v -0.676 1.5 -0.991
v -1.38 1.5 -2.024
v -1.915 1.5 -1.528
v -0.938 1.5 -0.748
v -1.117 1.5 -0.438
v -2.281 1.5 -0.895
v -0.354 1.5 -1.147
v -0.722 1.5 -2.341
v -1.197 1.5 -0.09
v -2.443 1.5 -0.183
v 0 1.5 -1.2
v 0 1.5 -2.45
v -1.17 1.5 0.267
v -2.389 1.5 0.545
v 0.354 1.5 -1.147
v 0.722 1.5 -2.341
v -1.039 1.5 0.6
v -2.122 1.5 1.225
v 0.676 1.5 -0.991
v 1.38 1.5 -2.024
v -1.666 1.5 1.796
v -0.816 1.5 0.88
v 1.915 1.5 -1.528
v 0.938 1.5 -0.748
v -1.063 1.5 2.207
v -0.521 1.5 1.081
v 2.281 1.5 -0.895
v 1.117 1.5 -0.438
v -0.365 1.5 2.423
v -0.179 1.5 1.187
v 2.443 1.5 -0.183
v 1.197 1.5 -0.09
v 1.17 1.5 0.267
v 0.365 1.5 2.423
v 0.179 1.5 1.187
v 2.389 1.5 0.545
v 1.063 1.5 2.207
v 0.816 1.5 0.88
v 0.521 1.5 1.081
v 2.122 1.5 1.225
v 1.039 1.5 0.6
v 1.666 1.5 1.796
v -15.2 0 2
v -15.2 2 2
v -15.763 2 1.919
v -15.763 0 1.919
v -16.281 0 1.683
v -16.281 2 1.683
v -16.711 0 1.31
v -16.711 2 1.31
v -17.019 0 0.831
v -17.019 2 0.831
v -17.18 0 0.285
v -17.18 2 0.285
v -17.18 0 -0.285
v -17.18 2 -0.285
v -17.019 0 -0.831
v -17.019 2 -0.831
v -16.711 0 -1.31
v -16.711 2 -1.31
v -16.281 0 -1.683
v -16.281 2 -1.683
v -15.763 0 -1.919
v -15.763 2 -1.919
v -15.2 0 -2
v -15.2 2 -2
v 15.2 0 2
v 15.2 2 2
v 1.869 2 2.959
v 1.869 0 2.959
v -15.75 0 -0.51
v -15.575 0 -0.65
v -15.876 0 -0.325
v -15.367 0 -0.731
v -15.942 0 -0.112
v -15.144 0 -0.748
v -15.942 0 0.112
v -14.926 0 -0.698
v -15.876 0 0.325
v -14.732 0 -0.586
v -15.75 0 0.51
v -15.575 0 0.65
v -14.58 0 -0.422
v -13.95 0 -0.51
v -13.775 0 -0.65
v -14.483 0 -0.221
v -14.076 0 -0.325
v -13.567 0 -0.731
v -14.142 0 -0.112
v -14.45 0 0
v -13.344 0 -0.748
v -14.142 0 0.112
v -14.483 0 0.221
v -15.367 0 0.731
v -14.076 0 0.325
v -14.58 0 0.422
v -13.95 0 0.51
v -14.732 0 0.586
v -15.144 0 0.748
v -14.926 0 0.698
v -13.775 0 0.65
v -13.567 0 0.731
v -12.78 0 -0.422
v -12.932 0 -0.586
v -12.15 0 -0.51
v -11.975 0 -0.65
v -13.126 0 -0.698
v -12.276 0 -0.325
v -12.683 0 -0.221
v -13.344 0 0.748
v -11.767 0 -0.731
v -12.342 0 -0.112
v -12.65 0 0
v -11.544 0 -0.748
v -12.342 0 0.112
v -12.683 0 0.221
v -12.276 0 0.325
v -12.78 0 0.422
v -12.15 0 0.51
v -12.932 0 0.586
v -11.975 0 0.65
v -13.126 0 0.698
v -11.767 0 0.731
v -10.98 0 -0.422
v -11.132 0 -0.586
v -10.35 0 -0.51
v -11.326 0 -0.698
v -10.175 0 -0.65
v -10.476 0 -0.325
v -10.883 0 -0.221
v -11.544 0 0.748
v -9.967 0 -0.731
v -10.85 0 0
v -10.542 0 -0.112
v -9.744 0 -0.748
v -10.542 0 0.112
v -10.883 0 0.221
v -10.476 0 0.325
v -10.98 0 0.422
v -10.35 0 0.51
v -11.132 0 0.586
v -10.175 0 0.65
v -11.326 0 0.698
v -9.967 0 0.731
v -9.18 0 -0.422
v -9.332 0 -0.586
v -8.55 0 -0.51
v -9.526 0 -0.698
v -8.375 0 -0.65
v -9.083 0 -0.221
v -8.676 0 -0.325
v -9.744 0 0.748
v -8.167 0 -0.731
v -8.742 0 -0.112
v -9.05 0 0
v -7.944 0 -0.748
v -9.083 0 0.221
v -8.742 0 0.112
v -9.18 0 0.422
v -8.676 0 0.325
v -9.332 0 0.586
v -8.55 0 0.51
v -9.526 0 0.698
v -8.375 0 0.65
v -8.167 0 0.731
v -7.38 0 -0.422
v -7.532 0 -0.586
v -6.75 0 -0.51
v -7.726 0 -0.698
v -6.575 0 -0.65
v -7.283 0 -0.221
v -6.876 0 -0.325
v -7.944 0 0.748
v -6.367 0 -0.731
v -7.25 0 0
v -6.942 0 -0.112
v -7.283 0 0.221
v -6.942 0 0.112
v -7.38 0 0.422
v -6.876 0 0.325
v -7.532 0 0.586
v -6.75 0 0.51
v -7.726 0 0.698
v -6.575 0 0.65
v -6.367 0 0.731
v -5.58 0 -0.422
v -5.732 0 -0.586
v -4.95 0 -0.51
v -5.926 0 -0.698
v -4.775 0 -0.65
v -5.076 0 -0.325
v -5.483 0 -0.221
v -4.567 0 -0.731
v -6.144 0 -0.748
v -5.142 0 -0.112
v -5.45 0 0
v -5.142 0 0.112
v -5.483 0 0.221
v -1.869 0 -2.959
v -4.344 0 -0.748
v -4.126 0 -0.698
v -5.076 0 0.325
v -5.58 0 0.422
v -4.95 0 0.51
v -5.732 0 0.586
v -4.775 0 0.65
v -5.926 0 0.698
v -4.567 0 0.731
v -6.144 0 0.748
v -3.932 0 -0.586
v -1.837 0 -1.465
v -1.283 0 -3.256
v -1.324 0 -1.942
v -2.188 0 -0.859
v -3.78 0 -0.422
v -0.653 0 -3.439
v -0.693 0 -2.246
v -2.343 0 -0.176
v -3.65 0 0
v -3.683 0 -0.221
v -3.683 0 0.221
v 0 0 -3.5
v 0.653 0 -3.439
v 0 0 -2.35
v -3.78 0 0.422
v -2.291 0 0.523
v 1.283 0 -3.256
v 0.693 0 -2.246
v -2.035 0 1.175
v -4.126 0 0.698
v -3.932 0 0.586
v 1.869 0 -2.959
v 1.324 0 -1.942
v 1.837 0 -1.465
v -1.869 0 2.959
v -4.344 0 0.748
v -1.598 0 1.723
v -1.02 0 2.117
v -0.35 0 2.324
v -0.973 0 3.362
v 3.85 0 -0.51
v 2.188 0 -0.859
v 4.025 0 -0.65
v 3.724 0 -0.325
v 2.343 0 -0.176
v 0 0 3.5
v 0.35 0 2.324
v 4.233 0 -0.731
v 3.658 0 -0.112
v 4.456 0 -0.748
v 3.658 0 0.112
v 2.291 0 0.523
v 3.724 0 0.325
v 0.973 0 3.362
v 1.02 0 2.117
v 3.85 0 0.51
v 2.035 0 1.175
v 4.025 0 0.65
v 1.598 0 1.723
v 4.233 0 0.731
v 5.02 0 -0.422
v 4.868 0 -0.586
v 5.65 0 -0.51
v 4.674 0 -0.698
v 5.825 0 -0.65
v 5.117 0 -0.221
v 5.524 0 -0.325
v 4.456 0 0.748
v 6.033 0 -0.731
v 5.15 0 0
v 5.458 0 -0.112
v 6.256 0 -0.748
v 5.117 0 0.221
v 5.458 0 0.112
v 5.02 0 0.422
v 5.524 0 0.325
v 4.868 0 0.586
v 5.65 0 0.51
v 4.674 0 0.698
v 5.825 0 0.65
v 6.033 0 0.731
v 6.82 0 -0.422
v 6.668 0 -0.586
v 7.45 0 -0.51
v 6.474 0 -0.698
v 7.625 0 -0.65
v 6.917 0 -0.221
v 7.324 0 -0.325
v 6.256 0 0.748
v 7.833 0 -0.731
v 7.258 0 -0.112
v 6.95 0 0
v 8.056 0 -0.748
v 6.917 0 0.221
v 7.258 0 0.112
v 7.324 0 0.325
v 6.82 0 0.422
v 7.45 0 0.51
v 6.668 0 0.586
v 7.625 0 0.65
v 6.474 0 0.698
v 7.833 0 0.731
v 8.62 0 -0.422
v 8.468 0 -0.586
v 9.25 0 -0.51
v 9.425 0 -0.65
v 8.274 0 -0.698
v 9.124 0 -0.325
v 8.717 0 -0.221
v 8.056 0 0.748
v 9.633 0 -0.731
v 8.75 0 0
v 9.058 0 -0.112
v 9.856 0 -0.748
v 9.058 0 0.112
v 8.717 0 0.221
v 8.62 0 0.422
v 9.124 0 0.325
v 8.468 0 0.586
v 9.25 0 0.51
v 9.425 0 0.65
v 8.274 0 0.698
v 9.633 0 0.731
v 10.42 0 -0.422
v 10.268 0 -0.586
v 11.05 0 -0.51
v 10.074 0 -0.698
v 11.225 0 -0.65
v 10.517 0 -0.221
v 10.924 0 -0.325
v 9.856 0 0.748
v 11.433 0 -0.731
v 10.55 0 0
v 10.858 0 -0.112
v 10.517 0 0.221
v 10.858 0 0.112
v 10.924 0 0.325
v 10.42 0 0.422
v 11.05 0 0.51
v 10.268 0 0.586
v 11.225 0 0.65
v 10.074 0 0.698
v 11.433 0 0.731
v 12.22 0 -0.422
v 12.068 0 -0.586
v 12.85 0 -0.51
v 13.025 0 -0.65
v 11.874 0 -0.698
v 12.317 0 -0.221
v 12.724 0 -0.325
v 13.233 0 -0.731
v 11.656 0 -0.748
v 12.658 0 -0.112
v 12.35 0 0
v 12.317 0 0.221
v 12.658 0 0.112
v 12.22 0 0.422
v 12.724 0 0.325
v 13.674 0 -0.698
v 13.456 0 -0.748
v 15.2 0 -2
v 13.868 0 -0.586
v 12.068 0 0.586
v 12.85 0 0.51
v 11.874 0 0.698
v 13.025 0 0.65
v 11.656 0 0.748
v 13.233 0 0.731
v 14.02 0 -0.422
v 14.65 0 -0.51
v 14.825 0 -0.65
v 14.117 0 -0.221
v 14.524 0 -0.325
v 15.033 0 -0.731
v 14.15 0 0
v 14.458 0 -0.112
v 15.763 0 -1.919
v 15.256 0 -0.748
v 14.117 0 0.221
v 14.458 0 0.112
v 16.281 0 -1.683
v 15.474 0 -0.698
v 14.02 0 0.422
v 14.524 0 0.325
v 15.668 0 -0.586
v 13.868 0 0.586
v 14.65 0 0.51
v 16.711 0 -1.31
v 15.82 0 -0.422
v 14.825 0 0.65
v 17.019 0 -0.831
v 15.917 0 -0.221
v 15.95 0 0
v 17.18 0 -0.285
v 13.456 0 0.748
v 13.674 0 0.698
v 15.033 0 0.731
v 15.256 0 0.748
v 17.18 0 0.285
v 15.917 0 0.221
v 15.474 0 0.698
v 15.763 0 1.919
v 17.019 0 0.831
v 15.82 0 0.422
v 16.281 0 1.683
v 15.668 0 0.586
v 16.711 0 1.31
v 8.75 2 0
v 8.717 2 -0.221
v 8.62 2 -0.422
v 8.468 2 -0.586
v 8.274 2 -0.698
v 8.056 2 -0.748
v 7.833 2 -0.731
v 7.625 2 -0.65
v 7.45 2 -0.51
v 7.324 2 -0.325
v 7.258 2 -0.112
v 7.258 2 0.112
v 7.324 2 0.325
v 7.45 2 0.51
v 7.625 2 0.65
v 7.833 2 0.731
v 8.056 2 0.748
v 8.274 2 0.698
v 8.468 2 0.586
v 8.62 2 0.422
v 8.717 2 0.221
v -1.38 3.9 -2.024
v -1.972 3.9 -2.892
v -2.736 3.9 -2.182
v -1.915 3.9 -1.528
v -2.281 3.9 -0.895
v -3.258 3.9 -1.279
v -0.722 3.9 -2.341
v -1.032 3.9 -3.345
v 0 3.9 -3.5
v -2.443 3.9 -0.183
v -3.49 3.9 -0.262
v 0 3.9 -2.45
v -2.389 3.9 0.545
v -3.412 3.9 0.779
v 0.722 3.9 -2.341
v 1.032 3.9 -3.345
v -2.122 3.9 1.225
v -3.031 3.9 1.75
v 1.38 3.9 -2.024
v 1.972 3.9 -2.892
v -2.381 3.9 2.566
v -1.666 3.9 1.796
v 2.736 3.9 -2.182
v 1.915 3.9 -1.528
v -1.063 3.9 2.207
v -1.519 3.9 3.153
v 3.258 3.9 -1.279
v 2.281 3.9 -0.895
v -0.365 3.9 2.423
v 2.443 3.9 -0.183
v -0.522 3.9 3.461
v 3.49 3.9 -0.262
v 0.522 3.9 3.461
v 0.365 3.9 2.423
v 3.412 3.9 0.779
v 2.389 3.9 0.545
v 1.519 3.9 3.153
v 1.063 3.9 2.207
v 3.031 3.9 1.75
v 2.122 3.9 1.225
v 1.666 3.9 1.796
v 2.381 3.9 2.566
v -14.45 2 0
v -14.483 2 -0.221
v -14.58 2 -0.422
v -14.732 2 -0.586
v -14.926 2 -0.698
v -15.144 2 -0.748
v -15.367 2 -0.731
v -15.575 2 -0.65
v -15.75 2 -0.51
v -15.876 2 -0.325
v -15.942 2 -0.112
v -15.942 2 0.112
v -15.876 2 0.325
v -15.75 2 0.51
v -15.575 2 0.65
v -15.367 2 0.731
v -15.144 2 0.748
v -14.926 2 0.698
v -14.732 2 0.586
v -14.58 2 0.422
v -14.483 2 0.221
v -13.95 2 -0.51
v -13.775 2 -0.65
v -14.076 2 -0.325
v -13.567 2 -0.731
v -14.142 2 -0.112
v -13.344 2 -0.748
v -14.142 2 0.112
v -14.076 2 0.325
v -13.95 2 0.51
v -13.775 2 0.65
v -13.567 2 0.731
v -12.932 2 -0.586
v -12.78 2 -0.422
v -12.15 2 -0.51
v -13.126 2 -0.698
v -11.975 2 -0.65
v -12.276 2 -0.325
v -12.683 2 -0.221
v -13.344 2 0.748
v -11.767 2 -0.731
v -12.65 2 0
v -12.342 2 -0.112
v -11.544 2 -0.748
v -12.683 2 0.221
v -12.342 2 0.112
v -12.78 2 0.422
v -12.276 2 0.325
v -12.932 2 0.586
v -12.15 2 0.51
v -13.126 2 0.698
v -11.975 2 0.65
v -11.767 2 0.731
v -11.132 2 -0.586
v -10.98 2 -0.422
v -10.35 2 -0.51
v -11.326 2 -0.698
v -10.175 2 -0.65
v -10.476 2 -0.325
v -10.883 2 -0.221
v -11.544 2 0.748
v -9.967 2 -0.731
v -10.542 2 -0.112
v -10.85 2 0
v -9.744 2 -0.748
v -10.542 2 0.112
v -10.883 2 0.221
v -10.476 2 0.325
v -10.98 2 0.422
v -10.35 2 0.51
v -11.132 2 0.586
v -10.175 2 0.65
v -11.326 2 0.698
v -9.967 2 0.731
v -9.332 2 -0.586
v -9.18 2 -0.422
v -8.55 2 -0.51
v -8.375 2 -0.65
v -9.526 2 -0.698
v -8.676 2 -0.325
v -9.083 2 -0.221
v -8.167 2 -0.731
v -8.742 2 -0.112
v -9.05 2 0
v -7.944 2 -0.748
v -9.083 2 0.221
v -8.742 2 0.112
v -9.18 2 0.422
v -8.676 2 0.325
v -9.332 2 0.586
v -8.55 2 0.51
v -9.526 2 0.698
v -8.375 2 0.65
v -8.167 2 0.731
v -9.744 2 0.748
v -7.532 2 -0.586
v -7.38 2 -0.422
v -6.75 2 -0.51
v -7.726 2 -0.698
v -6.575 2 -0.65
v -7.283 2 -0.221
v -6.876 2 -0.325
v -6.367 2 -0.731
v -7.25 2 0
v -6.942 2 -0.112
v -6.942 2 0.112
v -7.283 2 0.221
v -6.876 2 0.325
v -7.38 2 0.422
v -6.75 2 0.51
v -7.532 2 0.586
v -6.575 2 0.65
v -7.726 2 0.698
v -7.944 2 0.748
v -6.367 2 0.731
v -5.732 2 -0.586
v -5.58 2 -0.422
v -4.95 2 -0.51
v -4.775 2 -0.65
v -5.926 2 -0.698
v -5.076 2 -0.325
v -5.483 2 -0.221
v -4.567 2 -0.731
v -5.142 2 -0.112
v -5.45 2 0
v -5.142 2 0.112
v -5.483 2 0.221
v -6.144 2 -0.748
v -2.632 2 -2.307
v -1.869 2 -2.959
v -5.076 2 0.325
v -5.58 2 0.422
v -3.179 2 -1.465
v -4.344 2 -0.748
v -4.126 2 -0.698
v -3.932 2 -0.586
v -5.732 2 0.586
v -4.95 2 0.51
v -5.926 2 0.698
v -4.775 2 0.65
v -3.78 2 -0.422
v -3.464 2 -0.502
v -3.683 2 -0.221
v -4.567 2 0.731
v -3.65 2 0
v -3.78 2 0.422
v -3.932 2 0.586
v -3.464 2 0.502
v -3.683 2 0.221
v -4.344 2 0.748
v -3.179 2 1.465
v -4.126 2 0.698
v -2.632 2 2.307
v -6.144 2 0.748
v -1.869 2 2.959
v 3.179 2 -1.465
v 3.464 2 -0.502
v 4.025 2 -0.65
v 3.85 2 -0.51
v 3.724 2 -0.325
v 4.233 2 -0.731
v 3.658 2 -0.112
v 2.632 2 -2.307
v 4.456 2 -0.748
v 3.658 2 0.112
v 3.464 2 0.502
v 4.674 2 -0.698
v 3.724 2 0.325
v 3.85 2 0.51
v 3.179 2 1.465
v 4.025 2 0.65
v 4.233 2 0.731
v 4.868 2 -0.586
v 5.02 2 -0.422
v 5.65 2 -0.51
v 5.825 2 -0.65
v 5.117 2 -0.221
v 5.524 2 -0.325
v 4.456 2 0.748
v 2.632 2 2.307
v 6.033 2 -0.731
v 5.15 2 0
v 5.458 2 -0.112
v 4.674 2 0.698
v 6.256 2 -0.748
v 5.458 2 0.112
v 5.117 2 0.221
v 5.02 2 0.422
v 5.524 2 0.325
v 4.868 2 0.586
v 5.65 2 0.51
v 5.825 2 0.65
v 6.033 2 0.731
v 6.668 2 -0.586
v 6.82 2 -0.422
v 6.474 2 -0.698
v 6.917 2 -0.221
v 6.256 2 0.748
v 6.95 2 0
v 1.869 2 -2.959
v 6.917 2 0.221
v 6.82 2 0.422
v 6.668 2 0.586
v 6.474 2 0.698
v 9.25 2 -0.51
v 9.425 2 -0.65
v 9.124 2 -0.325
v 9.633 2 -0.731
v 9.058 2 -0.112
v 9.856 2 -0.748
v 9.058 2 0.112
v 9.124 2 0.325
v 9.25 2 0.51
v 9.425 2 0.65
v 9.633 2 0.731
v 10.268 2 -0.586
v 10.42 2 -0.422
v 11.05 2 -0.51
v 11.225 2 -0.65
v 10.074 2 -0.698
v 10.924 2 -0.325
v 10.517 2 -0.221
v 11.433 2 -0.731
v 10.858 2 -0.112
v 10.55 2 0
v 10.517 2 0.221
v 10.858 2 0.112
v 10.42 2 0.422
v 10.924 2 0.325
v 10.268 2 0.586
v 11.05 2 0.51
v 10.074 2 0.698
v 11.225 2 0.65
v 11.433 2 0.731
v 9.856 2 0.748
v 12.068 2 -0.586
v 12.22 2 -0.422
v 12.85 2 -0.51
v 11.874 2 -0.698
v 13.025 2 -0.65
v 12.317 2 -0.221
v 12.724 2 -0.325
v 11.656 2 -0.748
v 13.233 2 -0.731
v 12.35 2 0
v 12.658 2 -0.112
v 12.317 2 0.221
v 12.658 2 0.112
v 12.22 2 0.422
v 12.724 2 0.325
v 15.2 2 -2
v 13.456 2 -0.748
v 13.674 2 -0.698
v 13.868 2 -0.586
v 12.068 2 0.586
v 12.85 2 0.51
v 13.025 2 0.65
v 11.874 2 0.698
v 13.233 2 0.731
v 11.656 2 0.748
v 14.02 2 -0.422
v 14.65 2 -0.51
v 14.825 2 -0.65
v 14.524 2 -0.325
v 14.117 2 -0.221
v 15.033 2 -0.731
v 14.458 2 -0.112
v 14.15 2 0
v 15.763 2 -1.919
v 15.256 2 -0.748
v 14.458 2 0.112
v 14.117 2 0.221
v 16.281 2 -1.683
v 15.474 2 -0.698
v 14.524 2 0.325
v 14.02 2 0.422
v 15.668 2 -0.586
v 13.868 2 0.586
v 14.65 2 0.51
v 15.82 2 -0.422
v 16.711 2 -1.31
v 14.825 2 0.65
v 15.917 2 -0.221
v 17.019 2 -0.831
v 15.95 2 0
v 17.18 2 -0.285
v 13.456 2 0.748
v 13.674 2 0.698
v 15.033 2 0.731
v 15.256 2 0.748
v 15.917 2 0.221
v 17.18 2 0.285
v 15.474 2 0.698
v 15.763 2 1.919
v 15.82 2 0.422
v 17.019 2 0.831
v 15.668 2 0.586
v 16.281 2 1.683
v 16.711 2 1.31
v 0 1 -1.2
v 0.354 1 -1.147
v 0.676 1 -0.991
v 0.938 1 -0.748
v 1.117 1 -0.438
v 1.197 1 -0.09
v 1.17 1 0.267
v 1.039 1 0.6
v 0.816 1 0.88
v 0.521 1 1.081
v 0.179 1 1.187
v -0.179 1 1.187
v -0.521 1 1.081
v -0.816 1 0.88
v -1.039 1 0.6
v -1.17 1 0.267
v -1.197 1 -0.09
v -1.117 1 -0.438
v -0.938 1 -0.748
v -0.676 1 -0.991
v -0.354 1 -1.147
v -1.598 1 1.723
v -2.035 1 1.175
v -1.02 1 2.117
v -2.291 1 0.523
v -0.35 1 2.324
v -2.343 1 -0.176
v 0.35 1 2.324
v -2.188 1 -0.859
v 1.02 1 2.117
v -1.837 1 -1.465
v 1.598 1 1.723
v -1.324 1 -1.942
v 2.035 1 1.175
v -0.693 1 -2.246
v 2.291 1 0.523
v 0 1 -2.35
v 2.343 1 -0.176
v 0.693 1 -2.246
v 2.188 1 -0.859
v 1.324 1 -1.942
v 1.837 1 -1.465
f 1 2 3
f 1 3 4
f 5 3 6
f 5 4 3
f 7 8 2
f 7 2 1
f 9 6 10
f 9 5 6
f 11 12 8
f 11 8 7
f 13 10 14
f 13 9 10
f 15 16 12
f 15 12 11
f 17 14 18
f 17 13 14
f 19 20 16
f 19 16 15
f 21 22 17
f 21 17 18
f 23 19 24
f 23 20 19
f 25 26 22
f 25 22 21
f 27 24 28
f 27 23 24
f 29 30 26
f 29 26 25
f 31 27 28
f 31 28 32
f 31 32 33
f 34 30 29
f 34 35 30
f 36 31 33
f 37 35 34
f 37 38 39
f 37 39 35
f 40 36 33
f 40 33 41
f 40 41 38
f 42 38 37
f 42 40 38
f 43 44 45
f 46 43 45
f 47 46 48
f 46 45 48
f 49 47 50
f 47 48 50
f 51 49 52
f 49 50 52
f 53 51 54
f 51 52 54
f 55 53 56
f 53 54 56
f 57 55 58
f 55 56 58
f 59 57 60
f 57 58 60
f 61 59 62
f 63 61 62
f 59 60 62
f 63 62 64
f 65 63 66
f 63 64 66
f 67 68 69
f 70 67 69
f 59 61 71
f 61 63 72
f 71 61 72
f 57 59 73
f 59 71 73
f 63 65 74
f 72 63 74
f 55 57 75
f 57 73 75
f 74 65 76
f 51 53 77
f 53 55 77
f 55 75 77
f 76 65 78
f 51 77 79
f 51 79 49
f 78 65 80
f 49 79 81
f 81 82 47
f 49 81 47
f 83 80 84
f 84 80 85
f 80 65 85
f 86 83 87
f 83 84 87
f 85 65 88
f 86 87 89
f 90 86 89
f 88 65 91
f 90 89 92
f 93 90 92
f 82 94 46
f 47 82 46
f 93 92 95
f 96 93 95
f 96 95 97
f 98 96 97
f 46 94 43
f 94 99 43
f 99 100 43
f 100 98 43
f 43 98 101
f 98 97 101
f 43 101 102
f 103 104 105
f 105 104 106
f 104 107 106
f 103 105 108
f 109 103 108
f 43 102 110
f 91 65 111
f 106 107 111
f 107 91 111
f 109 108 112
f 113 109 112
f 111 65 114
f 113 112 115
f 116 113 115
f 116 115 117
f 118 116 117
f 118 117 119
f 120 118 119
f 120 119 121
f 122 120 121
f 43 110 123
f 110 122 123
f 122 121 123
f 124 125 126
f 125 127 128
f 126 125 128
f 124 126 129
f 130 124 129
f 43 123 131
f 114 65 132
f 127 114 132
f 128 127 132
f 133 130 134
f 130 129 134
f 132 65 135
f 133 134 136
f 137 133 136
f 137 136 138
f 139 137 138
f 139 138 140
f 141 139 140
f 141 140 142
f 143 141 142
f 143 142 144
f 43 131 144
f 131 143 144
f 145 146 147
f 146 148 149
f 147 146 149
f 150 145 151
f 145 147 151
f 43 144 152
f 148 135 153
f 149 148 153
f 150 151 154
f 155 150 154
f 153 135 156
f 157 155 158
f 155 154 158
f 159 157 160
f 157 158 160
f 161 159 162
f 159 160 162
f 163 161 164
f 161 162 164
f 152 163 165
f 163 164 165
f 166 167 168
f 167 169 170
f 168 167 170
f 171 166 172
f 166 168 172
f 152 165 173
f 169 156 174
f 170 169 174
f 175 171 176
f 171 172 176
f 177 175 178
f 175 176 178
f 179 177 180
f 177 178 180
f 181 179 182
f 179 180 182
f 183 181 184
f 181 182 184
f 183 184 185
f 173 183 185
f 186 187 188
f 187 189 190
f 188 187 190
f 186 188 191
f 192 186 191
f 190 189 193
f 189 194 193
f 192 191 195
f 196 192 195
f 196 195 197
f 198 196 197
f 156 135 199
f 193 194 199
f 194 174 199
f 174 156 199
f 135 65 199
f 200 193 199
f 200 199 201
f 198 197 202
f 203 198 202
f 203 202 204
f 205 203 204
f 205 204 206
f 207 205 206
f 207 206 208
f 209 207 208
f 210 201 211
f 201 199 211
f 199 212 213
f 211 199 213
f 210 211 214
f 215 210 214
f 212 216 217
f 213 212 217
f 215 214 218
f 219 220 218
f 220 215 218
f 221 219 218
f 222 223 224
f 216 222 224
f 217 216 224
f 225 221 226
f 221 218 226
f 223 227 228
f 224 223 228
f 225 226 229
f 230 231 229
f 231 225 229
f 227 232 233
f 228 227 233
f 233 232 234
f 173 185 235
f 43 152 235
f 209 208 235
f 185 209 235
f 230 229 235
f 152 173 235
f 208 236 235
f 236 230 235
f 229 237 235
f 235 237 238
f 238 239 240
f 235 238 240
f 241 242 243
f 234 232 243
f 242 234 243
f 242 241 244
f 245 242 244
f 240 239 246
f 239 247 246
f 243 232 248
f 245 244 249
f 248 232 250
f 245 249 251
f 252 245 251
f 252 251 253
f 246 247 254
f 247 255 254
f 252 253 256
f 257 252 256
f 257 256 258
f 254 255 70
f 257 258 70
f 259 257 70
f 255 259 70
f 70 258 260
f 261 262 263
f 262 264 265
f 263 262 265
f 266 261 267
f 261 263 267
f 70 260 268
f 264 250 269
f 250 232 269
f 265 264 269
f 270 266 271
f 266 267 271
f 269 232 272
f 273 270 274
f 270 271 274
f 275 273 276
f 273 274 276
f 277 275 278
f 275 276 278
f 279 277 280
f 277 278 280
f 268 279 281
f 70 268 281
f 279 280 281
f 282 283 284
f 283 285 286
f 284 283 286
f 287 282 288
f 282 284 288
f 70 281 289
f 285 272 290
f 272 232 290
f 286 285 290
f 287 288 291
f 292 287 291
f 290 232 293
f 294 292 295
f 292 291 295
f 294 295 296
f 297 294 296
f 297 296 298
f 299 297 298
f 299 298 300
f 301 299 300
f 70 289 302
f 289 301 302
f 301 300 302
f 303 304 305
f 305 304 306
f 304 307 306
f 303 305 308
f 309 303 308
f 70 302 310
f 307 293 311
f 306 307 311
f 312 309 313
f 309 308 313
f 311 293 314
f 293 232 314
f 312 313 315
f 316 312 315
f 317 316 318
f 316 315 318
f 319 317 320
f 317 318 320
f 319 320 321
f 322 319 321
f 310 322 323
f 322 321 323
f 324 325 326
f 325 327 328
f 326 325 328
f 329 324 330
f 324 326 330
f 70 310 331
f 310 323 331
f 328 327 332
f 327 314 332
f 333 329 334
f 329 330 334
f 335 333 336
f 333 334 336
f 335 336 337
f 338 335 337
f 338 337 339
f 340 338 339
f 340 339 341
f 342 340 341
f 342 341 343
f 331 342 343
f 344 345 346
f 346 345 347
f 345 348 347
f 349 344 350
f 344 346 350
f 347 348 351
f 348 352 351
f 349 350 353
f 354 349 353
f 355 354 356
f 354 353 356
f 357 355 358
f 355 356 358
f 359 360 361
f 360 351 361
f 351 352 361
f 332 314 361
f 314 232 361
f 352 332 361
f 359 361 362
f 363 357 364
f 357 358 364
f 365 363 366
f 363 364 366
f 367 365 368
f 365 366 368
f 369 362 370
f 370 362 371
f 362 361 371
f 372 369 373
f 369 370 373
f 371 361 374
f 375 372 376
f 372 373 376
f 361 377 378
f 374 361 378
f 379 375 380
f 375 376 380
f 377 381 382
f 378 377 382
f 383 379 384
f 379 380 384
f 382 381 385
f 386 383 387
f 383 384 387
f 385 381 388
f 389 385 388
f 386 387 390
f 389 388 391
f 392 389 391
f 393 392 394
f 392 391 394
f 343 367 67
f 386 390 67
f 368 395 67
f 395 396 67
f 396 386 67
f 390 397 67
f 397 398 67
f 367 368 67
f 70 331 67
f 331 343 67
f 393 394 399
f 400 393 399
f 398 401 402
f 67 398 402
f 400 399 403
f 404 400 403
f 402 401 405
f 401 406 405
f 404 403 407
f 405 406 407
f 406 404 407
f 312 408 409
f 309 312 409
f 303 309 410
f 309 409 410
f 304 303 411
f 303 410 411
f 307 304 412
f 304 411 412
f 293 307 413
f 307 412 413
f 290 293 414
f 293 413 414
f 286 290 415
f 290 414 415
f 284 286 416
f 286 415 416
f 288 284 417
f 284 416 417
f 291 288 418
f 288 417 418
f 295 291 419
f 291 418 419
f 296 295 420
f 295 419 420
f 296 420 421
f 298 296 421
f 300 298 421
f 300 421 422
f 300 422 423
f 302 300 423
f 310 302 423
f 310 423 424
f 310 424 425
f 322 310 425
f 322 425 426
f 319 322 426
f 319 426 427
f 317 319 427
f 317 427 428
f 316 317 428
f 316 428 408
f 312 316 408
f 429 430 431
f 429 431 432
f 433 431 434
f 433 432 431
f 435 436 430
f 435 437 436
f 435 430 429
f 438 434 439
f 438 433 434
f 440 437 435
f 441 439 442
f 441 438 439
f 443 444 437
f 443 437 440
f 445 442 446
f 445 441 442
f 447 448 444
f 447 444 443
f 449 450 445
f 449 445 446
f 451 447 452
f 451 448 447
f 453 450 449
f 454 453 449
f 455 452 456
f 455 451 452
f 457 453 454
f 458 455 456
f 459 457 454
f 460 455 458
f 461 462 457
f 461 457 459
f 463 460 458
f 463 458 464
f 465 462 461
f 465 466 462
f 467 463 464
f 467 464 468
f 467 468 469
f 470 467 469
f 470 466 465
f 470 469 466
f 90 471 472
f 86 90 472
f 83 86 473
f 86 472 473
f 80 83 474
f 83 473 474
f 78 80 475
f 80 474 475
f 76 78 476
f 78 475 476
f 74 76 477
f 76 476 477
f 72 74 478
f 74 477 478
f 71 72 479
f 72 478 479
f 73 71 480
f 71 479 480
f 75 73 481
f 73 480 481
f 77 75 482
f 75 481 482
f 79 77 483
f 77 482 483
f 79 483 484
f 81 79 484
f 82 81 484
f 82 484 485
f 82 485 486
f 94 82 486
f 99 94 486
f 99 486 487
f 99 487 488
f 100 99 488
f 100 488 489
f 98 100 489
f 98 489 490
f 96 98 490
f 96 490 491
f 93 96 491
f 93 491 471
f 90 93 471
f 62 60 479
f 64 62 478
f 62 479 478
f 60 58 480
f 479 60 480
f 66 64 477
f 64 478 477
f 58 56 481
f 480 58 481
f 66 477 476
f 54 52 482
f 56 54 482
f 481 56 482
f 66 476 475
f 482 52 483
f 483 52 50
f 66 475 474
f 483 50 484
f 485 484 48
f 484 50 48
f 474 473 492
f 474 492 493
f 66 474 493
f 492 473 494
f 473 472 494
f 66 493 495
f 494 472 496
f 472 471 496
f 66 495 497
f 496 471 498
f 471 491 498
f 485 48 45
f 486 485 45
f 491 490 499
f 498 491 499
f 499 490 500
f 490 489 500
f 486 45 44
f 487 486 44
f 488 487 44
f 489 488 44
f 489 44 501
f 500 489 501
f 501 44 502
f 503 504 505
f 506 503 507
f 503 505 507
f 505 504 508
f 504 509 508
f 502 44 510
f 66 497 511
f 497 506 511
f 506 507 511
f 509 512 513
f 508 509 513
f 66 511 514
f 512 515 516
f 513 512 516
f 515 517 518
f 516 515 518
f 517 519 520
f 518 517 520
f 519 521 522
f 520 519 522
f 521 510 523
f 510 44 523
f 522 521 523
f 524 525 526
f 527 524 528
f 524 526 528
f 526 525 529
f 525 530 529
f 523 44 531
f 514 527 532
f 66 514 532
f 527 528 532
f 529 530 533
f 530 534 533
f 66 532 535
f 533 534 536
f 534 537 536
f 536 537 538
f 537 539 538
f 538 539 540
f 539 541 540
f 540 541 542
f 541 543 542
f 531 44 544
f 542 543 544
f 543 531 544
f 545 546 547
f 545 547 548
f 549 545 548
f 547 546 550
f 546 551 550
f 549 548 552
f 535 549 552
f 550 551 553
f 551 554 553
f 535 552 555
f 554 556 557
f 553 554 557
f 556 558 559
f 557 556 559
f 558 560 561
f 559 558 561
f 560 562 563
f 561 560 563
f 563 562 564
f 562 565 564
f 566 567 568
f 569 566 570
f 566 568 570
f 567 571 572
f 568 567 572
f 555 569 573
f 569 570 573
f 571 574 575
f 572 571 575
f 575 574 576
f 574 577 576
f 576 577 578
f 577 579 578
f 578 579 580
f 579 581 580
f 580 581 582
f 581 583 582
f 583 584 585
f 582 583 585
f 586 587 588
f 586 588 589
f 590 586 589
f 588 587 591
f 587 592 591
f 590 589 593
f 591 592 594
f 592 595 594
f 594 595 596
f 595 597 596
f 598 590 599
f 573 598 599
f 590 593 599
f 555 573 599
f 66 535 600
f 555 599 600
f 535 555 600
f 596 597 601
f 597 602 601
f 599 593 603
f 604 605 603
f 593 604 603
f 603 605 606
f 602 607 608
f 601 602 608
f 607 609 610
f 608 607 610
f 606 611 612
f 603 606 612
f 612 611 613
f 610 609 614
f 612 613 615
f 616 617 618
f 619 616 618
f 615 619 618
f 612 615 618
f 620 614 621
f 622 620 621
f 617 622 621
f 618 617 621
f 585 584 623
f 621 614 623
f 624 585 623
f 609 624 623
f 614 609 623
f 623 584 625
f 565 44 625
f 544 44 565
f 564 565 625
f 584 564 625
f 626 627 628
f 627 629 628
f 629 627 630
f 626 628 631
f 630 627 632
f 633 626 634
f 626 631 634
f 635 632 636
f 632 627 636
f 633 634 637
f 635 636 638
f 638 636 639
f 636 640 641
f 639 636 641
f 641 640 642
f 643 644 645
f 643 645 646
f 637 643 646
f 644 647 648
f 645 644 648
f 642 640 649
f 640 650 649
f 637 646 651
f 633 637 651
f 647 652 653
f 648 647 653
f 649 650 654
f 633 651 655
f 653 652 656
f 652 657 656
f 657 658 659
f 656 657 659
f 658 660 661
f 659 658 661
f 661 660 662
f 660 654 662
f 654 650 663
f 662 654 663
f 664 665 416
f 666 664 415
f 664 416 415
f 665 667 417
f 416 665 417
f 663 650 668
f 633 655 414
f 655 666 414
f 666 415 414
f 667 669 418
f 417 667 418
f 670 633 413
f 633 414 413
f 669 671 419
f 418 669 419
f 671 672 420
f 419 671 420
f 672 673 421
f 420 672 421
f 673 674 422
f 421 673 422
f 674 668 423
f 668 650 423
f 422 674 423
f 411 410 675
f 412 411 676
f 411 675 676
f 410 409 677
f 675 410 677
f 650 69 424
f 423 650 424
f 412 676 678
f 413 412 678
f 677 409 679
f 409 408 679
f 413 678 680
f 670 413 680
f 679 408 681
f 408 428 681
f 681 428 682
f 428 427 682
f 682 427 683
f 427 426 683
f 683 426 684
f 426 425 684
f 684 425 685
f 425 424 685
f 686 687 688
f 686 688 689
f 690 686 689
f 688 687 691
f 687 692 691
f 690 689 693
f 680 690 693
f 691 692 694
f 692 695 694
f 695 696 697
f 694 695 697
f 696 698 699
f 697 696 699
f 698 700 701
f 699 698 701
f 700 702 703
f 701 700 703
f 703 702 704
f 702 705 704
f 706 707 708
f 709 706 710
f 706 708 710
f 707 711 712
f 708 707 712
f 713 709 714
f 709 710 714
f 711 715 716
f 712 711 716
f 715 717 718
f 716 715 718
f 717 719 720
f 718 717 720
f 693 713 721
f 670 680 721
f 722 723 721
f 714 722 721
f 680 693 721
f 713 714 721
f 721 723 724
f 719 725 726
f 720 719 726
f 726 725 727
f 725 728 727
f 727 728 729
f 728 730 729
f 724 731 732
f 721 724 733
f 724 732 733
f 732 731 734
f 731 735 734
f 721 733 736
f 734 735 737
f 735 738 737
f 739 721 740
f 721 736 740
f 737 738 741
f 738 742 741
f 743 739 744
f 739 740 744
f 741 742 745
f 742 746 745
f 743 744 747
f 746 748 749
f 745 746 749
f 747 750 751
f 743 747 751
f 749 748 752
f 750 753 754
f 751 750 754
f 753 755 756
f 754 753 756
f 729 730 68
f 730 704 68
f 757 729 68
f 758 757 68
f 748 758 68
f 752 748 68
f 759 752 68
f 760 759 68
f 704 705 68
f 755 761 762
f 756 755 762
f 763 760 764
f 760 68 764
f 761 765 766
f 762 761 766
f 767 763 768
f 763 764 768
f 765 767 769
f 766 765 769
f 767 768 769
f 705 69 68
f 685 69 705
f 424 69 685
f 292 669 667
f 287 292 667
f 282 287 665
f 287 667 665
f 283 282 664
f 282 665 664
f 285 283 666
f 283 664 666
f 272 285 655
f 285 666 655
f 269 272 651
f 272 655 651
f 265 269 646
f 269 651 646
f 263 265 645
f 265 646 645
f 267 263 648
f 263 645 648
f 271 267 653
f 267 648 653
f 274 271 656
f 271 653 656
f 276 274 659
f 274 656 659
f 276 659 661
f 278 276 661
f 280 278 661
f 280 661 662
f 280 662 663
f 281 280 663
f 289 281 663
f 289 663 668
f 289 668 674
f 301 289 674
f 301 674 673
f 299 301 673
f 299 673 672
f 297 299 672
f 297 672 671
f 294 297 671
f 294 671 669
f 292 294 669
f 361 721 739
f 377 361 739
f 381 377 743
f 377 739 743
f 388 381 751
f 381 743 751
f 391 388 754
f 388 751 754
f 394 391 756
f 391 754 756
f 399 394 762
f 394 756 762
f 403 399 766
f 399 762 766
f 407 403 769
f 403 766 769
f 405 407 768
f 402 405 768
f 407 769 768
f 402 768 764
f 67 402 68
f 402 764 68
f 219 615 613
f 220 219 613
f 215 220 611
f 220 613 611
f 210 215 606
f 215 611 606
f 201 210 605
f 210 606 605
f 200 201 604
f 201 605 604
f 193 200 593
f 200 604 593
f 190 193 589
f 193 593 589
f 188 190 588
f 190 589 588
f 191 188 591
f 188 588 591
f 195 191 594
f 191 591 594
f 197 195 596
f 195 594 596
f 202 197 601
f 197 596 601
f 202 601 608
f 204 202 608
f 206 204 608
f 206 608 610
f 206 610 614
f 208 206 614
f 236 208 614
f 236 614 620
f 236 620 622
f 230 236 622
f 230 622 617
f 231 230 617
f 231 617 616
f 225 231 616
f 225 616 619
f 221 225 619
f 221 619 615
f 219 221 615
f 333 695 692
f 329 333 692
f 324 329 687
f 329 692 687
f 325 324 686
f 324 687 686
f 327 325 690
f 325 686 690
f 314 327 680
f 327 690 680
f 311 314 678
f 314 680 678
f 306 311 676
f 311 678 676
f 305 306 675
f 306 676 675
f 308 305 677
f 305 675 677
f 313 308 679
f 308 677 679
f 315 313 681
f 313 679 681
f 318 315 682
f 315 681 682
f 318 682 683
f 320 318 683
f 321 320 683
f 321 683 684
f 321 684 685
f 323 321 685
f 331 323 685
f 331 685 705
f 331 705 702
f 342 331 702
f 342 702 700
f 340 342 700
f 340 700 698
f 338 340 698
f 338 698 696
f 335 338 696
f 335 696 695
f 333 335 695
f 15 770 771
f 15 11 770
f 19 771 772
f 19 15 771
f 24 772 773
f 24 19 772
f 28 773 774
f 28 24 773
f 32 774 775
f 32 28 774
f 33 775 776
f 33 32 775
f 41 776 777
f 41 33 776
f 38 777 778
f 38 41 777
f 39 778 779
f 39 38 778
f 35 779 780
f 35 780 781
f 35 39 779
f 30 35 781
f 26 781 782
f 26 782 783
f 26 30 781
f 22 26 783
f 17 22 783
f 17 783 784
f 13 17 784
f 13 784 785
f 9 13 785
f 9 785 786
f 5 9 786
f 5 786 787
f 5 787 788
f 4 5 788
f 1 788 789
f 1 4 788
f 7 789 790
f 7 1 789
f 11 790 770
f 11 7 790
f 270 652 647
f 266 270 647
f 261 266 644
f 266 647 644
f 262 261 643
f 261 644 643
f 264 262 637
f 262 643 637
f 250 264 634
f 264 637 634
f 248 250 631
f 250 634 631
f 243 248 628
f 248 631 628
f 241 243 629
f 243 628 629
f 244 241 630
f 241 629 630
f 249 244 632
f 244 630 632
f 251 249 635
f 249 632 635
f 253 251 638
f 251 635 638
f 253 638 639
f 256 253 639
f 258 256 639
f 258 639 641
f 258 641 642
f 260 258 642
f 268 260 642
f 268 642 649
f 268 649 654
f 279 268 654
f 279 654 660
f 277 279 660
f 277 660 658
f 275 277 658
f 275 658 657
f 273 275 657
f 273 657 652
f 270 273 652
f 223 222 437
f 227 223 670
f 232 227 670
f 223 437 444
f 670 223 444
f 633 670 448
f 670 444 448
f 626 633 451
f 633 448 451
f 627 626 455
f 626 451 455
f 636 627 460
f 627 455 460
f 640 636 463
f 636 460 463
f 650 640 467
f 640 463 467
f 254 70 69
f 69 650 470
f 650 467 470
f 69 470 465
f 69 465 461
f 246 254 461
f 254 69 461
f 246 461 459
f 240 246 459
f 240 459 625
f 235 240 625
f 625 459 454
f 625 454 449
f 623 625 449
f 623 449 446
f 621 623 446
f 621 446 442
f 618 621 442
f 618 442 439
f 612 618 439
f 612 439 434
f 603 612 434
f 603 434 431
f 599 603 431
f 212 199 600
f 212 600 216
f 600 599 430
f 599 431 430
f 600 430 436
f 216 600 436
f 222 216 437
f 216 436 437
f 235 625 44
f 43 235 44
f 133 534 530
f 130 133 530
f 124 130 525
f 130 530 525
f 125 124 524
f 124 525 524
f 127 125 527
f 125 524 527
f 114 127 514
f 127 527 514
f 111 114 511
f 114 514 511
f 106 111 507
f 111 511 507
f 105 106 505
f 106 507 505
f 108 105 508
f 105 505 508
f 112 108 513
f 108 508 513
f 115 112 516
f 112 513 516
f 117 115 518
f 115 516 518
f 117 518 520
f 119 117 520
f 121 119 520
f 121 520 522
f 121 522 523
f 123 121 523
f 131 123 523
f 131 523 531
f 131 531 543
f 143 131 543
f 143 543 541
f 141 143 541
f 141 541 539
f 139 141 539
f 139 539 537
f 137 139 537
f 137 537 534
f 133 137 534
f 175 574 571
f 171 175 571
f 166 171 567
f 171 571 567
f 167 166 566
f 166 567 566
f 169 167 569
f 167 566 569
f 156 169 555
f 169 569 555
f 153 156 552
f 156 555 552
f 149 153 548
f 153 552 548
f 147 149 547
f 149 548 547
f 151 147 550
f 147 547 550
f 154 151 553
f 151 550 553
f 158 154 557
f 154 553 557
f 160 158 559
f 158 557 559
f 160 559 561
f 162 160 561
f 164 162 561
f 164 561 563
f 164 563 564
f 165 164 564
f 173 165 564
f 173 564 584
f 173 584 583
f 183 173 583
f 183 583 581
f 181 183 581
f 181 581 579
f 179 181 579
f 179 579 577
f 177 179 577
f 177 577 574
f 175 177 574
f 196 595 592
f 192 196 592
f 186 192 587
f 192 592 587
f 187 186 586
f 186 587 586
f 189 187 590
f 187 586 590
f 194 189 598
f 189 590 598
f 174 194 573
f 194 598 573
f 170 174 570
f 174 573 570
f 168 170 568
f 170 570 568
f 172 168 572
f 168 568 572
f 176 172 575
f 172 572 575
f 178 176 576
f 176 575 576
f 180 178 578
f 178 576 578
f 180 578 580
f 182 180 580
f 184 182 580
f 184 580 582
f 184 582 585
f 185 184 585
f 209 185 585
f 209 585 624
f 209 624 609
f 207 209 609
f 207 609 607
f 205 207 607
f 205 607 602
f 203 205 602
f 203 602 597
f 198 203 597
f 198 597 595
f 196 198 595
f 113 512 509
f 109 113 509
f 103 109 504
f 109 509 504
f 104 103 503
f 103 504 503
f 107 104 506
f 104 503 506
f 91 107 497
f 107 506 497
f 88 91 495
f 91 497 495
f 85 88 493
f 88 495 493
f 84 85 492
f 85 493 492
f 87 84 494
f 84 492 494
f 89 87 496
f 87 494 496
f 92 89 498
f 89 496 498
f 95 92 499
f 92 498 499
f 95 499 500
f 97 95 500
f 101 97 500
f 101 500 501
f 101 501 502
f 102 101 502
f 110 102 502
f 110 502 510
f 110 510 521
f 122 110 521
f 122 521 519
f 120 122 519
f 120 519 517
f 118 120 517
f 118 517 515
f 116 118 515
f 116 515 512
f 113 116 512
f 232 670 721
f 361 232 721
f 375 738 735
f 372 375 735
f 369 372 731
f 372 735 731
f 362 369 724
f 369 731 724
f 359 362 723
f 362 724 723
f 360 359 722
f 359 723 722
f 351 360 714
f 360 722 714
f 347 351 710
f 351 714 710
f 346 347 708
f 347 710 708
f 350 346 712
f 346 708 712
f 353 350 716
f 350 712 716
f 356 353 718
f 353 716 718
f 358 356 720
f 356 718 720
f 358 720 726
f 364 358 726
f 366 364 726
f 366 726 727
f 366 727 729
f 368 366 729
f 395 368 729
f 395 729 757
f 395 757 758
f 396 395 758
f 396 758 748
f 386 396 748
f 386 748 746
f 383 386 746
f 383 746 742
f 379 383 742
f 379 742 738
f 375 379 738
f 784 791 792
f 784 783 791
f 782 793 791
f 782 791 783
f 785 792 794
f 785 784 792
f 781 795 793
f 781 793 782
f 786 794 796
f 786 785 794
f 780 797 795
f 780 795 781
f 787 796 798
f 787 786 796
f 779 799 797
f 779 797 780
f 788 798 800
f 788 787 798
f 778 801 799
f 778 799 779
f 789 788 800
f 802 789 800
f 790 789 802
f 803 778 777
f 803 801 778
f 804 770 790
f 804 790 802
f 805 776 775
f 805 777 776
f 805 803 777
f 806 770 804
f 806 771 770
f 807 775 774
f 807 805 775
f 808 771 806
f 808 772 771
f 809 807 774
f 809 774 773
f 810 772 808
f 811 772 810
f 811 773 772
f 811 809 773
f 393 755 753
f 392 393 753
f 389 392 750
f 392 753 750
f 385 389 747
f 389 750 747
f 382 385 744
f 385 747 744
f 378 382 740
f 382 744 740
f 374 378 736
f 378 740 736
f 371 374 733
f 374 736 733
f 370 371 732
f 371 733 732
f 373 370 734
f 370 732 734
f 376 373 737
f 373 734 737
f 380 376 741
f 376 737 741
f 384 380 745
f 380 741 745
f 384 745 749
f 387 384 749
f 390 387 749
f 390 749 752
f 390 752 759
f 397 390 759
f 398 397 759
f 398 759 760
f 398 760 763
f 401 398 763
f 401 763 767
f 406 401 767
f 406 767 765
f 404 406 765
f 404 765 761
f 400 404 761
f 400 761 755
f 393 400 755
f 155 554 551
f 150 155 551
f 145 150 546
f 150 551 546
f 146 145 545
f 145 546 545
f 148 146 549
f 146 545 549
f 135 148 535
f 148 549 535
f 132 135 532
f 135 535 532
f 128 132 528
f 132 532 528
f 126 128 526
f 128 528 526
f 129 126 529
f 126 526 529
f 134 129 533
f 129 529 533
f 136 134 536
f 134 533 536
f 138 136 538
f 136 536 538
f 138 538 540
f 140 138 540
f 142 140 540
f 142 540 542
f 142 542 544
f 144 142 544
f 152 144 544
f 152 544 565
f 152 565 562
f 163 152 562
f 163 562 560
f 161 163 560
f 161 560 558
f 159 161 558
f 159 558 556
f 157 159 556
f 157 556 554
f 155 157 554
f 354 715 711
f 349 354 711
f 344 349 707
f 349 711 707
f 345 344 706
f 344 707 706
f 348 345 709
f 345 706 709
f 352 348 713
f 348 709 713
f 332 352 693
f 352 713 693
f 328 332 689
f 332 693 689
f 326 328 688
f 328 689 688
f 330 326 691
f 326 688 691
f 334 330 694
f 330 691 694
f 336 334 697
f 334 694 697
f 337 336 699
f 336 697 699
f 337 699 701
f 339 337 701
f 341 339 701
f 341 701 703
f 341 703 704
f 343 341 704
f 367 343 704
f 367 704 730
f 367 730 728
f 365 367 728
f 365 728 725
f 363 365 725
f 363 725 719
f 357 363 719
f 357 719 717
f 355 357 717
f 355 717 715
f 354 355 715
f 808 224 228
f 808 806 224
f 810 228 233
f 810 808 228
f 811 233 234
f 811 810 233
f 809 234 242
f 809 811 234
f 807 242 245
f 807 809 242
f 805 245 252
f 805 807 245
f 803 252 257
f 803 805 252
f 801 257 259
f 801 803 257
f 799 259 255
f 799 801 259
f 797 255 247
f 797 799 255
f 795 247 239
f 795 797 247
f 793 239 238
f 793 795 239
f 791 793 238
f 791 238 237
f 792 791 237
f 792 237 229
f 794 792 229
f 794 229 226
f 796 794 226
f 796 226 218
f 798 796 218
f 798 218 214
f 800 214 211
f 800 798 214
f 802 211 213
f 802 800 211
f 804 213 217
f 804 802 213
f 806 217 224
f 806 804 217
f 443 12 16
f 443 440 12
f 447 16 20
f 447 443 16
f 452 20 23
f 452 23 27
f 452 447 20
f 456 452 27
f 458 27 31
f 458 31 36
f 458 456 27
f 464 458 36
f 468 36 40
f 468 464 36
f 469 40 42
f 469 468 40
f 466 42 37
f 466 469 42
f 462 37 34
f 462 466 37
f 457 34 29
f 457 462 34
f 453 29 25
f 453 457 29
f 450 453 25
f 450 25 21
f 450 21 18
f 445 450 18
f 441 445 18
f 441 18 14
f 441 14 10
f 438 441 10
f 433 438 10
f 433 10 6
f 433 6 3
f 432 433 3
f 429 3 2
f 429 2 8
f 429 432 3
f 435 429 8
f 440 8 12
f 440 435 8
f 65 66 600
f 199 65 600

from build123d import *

# Parameters (mm, degrees)
SKETCH1_W             = 3.5
SKETCH1_H             = 3.9
BOSS_EXTRUDE1_START   = -2
BOSS_EXTRUDE1_DEPTH   = 2
BOSS_EXTRUDE2_START   = -2
BOSS_EXTRUDE2_DEPTH   = 2
F_1_5MM_DOWEL_HOLE1_D = 1.5


with BuildPart() as part:
    # Sketch1 → Revolve1 (revolve)
    with BuildSketch(Plane.XY, mode=Mode.PRIVATE) as revolve1_sk:
        with Locations((1.75, 1.95)):
            Rectangle(SKETCH1_W, SKETCH1_H)
    revolve(revolve1_sk.sketch.rotate(Axis((0, 3.9, 0), (0, -1, 0)), 270), axis=Axis((0, 3.9, 0), (0, -1, 0)))

    # Sketch2 → Boss-Extrude1 (add)
    with BuildSketch(Plane.XZ.offset(BOSS_EXTRUDE1_START)):
        with BuildLine():
            Line((-1.868584713, 2.959457918), (-15.2, 2))
            ThreePointArc((-15.2, 2), (-17.2, 0), (-15.2, -2))
            Line((-15.2, -2), (-1.868584713, -2.959457918))
            ThreePointArc((-1.868584713, -2.959457918), (-3.5, 0), (-1.868584713, 2.959457918))
        make_face()
    extrude(amount=BOSS_EXTRUDE1_DEPTH)

    # Sketch3 → Boss-Extrude2 (add)
    with BuildSketch(Plane.XZ.offset(BOSS_EXTRUDE2_START)):
        with BuildLine():
            Line((1.868584713, -2.959457918), (15.2, -2))
            ThreePointArc((15.2, -2), (17.2, 0), (15.2, 2))
            Line((15.2, 2), (1.868584713, 2.959457918))
            ThreePointArc((1.868584713, 2.959457918), (3.5, 0), (1.868584713, -2.959457918))
        make_face()
    extrude(amount=BOSS_EXTRUDE2_DEPTH)

    # Sketch4 → Cut-Revolve1 (revolve, cut)
    with BuildSketch(Plane.XY, mode=Mode.PRIVATE) as cut_revolve1_sk:
        Polygon((2.45, 3.9), (0, 3.9), (0, 0), (2.35, 0), (2.35, 1), (1.2, 1), (1.2, 1.5), (2.45, 1.5), align=None)
    revolve(cut_revolve1_sk.sketch.rotate(Axis((0, 3.9, 0), (0, -1, 0)), 270), axis=Axis((0, 3.9, 0), (0, -1, 0)), mode=Mode.SUBTRACT)

    # Ø1.5mm Dowel Hole1 (through all)
    with Locations(Plane(origin=(0, 0, 0), x_dir=(-1, 0, 0), z_dir=(0, -1, 0))):
        with Locations((15.2, 0), (-15.2, 0), (13.4, 0), (11.6, 0), (9.8, 0), (8, 0), (6.2, 0), (4.4, 0), (-13.4, 0), (-11.6, 0), (-9.8, 0), (-8, 0), (-6.2, 0), (-4.4, 0)):
            Hole(F_1_5MM_DOWEL_HOLE1_D / 2)


solid = part.part
